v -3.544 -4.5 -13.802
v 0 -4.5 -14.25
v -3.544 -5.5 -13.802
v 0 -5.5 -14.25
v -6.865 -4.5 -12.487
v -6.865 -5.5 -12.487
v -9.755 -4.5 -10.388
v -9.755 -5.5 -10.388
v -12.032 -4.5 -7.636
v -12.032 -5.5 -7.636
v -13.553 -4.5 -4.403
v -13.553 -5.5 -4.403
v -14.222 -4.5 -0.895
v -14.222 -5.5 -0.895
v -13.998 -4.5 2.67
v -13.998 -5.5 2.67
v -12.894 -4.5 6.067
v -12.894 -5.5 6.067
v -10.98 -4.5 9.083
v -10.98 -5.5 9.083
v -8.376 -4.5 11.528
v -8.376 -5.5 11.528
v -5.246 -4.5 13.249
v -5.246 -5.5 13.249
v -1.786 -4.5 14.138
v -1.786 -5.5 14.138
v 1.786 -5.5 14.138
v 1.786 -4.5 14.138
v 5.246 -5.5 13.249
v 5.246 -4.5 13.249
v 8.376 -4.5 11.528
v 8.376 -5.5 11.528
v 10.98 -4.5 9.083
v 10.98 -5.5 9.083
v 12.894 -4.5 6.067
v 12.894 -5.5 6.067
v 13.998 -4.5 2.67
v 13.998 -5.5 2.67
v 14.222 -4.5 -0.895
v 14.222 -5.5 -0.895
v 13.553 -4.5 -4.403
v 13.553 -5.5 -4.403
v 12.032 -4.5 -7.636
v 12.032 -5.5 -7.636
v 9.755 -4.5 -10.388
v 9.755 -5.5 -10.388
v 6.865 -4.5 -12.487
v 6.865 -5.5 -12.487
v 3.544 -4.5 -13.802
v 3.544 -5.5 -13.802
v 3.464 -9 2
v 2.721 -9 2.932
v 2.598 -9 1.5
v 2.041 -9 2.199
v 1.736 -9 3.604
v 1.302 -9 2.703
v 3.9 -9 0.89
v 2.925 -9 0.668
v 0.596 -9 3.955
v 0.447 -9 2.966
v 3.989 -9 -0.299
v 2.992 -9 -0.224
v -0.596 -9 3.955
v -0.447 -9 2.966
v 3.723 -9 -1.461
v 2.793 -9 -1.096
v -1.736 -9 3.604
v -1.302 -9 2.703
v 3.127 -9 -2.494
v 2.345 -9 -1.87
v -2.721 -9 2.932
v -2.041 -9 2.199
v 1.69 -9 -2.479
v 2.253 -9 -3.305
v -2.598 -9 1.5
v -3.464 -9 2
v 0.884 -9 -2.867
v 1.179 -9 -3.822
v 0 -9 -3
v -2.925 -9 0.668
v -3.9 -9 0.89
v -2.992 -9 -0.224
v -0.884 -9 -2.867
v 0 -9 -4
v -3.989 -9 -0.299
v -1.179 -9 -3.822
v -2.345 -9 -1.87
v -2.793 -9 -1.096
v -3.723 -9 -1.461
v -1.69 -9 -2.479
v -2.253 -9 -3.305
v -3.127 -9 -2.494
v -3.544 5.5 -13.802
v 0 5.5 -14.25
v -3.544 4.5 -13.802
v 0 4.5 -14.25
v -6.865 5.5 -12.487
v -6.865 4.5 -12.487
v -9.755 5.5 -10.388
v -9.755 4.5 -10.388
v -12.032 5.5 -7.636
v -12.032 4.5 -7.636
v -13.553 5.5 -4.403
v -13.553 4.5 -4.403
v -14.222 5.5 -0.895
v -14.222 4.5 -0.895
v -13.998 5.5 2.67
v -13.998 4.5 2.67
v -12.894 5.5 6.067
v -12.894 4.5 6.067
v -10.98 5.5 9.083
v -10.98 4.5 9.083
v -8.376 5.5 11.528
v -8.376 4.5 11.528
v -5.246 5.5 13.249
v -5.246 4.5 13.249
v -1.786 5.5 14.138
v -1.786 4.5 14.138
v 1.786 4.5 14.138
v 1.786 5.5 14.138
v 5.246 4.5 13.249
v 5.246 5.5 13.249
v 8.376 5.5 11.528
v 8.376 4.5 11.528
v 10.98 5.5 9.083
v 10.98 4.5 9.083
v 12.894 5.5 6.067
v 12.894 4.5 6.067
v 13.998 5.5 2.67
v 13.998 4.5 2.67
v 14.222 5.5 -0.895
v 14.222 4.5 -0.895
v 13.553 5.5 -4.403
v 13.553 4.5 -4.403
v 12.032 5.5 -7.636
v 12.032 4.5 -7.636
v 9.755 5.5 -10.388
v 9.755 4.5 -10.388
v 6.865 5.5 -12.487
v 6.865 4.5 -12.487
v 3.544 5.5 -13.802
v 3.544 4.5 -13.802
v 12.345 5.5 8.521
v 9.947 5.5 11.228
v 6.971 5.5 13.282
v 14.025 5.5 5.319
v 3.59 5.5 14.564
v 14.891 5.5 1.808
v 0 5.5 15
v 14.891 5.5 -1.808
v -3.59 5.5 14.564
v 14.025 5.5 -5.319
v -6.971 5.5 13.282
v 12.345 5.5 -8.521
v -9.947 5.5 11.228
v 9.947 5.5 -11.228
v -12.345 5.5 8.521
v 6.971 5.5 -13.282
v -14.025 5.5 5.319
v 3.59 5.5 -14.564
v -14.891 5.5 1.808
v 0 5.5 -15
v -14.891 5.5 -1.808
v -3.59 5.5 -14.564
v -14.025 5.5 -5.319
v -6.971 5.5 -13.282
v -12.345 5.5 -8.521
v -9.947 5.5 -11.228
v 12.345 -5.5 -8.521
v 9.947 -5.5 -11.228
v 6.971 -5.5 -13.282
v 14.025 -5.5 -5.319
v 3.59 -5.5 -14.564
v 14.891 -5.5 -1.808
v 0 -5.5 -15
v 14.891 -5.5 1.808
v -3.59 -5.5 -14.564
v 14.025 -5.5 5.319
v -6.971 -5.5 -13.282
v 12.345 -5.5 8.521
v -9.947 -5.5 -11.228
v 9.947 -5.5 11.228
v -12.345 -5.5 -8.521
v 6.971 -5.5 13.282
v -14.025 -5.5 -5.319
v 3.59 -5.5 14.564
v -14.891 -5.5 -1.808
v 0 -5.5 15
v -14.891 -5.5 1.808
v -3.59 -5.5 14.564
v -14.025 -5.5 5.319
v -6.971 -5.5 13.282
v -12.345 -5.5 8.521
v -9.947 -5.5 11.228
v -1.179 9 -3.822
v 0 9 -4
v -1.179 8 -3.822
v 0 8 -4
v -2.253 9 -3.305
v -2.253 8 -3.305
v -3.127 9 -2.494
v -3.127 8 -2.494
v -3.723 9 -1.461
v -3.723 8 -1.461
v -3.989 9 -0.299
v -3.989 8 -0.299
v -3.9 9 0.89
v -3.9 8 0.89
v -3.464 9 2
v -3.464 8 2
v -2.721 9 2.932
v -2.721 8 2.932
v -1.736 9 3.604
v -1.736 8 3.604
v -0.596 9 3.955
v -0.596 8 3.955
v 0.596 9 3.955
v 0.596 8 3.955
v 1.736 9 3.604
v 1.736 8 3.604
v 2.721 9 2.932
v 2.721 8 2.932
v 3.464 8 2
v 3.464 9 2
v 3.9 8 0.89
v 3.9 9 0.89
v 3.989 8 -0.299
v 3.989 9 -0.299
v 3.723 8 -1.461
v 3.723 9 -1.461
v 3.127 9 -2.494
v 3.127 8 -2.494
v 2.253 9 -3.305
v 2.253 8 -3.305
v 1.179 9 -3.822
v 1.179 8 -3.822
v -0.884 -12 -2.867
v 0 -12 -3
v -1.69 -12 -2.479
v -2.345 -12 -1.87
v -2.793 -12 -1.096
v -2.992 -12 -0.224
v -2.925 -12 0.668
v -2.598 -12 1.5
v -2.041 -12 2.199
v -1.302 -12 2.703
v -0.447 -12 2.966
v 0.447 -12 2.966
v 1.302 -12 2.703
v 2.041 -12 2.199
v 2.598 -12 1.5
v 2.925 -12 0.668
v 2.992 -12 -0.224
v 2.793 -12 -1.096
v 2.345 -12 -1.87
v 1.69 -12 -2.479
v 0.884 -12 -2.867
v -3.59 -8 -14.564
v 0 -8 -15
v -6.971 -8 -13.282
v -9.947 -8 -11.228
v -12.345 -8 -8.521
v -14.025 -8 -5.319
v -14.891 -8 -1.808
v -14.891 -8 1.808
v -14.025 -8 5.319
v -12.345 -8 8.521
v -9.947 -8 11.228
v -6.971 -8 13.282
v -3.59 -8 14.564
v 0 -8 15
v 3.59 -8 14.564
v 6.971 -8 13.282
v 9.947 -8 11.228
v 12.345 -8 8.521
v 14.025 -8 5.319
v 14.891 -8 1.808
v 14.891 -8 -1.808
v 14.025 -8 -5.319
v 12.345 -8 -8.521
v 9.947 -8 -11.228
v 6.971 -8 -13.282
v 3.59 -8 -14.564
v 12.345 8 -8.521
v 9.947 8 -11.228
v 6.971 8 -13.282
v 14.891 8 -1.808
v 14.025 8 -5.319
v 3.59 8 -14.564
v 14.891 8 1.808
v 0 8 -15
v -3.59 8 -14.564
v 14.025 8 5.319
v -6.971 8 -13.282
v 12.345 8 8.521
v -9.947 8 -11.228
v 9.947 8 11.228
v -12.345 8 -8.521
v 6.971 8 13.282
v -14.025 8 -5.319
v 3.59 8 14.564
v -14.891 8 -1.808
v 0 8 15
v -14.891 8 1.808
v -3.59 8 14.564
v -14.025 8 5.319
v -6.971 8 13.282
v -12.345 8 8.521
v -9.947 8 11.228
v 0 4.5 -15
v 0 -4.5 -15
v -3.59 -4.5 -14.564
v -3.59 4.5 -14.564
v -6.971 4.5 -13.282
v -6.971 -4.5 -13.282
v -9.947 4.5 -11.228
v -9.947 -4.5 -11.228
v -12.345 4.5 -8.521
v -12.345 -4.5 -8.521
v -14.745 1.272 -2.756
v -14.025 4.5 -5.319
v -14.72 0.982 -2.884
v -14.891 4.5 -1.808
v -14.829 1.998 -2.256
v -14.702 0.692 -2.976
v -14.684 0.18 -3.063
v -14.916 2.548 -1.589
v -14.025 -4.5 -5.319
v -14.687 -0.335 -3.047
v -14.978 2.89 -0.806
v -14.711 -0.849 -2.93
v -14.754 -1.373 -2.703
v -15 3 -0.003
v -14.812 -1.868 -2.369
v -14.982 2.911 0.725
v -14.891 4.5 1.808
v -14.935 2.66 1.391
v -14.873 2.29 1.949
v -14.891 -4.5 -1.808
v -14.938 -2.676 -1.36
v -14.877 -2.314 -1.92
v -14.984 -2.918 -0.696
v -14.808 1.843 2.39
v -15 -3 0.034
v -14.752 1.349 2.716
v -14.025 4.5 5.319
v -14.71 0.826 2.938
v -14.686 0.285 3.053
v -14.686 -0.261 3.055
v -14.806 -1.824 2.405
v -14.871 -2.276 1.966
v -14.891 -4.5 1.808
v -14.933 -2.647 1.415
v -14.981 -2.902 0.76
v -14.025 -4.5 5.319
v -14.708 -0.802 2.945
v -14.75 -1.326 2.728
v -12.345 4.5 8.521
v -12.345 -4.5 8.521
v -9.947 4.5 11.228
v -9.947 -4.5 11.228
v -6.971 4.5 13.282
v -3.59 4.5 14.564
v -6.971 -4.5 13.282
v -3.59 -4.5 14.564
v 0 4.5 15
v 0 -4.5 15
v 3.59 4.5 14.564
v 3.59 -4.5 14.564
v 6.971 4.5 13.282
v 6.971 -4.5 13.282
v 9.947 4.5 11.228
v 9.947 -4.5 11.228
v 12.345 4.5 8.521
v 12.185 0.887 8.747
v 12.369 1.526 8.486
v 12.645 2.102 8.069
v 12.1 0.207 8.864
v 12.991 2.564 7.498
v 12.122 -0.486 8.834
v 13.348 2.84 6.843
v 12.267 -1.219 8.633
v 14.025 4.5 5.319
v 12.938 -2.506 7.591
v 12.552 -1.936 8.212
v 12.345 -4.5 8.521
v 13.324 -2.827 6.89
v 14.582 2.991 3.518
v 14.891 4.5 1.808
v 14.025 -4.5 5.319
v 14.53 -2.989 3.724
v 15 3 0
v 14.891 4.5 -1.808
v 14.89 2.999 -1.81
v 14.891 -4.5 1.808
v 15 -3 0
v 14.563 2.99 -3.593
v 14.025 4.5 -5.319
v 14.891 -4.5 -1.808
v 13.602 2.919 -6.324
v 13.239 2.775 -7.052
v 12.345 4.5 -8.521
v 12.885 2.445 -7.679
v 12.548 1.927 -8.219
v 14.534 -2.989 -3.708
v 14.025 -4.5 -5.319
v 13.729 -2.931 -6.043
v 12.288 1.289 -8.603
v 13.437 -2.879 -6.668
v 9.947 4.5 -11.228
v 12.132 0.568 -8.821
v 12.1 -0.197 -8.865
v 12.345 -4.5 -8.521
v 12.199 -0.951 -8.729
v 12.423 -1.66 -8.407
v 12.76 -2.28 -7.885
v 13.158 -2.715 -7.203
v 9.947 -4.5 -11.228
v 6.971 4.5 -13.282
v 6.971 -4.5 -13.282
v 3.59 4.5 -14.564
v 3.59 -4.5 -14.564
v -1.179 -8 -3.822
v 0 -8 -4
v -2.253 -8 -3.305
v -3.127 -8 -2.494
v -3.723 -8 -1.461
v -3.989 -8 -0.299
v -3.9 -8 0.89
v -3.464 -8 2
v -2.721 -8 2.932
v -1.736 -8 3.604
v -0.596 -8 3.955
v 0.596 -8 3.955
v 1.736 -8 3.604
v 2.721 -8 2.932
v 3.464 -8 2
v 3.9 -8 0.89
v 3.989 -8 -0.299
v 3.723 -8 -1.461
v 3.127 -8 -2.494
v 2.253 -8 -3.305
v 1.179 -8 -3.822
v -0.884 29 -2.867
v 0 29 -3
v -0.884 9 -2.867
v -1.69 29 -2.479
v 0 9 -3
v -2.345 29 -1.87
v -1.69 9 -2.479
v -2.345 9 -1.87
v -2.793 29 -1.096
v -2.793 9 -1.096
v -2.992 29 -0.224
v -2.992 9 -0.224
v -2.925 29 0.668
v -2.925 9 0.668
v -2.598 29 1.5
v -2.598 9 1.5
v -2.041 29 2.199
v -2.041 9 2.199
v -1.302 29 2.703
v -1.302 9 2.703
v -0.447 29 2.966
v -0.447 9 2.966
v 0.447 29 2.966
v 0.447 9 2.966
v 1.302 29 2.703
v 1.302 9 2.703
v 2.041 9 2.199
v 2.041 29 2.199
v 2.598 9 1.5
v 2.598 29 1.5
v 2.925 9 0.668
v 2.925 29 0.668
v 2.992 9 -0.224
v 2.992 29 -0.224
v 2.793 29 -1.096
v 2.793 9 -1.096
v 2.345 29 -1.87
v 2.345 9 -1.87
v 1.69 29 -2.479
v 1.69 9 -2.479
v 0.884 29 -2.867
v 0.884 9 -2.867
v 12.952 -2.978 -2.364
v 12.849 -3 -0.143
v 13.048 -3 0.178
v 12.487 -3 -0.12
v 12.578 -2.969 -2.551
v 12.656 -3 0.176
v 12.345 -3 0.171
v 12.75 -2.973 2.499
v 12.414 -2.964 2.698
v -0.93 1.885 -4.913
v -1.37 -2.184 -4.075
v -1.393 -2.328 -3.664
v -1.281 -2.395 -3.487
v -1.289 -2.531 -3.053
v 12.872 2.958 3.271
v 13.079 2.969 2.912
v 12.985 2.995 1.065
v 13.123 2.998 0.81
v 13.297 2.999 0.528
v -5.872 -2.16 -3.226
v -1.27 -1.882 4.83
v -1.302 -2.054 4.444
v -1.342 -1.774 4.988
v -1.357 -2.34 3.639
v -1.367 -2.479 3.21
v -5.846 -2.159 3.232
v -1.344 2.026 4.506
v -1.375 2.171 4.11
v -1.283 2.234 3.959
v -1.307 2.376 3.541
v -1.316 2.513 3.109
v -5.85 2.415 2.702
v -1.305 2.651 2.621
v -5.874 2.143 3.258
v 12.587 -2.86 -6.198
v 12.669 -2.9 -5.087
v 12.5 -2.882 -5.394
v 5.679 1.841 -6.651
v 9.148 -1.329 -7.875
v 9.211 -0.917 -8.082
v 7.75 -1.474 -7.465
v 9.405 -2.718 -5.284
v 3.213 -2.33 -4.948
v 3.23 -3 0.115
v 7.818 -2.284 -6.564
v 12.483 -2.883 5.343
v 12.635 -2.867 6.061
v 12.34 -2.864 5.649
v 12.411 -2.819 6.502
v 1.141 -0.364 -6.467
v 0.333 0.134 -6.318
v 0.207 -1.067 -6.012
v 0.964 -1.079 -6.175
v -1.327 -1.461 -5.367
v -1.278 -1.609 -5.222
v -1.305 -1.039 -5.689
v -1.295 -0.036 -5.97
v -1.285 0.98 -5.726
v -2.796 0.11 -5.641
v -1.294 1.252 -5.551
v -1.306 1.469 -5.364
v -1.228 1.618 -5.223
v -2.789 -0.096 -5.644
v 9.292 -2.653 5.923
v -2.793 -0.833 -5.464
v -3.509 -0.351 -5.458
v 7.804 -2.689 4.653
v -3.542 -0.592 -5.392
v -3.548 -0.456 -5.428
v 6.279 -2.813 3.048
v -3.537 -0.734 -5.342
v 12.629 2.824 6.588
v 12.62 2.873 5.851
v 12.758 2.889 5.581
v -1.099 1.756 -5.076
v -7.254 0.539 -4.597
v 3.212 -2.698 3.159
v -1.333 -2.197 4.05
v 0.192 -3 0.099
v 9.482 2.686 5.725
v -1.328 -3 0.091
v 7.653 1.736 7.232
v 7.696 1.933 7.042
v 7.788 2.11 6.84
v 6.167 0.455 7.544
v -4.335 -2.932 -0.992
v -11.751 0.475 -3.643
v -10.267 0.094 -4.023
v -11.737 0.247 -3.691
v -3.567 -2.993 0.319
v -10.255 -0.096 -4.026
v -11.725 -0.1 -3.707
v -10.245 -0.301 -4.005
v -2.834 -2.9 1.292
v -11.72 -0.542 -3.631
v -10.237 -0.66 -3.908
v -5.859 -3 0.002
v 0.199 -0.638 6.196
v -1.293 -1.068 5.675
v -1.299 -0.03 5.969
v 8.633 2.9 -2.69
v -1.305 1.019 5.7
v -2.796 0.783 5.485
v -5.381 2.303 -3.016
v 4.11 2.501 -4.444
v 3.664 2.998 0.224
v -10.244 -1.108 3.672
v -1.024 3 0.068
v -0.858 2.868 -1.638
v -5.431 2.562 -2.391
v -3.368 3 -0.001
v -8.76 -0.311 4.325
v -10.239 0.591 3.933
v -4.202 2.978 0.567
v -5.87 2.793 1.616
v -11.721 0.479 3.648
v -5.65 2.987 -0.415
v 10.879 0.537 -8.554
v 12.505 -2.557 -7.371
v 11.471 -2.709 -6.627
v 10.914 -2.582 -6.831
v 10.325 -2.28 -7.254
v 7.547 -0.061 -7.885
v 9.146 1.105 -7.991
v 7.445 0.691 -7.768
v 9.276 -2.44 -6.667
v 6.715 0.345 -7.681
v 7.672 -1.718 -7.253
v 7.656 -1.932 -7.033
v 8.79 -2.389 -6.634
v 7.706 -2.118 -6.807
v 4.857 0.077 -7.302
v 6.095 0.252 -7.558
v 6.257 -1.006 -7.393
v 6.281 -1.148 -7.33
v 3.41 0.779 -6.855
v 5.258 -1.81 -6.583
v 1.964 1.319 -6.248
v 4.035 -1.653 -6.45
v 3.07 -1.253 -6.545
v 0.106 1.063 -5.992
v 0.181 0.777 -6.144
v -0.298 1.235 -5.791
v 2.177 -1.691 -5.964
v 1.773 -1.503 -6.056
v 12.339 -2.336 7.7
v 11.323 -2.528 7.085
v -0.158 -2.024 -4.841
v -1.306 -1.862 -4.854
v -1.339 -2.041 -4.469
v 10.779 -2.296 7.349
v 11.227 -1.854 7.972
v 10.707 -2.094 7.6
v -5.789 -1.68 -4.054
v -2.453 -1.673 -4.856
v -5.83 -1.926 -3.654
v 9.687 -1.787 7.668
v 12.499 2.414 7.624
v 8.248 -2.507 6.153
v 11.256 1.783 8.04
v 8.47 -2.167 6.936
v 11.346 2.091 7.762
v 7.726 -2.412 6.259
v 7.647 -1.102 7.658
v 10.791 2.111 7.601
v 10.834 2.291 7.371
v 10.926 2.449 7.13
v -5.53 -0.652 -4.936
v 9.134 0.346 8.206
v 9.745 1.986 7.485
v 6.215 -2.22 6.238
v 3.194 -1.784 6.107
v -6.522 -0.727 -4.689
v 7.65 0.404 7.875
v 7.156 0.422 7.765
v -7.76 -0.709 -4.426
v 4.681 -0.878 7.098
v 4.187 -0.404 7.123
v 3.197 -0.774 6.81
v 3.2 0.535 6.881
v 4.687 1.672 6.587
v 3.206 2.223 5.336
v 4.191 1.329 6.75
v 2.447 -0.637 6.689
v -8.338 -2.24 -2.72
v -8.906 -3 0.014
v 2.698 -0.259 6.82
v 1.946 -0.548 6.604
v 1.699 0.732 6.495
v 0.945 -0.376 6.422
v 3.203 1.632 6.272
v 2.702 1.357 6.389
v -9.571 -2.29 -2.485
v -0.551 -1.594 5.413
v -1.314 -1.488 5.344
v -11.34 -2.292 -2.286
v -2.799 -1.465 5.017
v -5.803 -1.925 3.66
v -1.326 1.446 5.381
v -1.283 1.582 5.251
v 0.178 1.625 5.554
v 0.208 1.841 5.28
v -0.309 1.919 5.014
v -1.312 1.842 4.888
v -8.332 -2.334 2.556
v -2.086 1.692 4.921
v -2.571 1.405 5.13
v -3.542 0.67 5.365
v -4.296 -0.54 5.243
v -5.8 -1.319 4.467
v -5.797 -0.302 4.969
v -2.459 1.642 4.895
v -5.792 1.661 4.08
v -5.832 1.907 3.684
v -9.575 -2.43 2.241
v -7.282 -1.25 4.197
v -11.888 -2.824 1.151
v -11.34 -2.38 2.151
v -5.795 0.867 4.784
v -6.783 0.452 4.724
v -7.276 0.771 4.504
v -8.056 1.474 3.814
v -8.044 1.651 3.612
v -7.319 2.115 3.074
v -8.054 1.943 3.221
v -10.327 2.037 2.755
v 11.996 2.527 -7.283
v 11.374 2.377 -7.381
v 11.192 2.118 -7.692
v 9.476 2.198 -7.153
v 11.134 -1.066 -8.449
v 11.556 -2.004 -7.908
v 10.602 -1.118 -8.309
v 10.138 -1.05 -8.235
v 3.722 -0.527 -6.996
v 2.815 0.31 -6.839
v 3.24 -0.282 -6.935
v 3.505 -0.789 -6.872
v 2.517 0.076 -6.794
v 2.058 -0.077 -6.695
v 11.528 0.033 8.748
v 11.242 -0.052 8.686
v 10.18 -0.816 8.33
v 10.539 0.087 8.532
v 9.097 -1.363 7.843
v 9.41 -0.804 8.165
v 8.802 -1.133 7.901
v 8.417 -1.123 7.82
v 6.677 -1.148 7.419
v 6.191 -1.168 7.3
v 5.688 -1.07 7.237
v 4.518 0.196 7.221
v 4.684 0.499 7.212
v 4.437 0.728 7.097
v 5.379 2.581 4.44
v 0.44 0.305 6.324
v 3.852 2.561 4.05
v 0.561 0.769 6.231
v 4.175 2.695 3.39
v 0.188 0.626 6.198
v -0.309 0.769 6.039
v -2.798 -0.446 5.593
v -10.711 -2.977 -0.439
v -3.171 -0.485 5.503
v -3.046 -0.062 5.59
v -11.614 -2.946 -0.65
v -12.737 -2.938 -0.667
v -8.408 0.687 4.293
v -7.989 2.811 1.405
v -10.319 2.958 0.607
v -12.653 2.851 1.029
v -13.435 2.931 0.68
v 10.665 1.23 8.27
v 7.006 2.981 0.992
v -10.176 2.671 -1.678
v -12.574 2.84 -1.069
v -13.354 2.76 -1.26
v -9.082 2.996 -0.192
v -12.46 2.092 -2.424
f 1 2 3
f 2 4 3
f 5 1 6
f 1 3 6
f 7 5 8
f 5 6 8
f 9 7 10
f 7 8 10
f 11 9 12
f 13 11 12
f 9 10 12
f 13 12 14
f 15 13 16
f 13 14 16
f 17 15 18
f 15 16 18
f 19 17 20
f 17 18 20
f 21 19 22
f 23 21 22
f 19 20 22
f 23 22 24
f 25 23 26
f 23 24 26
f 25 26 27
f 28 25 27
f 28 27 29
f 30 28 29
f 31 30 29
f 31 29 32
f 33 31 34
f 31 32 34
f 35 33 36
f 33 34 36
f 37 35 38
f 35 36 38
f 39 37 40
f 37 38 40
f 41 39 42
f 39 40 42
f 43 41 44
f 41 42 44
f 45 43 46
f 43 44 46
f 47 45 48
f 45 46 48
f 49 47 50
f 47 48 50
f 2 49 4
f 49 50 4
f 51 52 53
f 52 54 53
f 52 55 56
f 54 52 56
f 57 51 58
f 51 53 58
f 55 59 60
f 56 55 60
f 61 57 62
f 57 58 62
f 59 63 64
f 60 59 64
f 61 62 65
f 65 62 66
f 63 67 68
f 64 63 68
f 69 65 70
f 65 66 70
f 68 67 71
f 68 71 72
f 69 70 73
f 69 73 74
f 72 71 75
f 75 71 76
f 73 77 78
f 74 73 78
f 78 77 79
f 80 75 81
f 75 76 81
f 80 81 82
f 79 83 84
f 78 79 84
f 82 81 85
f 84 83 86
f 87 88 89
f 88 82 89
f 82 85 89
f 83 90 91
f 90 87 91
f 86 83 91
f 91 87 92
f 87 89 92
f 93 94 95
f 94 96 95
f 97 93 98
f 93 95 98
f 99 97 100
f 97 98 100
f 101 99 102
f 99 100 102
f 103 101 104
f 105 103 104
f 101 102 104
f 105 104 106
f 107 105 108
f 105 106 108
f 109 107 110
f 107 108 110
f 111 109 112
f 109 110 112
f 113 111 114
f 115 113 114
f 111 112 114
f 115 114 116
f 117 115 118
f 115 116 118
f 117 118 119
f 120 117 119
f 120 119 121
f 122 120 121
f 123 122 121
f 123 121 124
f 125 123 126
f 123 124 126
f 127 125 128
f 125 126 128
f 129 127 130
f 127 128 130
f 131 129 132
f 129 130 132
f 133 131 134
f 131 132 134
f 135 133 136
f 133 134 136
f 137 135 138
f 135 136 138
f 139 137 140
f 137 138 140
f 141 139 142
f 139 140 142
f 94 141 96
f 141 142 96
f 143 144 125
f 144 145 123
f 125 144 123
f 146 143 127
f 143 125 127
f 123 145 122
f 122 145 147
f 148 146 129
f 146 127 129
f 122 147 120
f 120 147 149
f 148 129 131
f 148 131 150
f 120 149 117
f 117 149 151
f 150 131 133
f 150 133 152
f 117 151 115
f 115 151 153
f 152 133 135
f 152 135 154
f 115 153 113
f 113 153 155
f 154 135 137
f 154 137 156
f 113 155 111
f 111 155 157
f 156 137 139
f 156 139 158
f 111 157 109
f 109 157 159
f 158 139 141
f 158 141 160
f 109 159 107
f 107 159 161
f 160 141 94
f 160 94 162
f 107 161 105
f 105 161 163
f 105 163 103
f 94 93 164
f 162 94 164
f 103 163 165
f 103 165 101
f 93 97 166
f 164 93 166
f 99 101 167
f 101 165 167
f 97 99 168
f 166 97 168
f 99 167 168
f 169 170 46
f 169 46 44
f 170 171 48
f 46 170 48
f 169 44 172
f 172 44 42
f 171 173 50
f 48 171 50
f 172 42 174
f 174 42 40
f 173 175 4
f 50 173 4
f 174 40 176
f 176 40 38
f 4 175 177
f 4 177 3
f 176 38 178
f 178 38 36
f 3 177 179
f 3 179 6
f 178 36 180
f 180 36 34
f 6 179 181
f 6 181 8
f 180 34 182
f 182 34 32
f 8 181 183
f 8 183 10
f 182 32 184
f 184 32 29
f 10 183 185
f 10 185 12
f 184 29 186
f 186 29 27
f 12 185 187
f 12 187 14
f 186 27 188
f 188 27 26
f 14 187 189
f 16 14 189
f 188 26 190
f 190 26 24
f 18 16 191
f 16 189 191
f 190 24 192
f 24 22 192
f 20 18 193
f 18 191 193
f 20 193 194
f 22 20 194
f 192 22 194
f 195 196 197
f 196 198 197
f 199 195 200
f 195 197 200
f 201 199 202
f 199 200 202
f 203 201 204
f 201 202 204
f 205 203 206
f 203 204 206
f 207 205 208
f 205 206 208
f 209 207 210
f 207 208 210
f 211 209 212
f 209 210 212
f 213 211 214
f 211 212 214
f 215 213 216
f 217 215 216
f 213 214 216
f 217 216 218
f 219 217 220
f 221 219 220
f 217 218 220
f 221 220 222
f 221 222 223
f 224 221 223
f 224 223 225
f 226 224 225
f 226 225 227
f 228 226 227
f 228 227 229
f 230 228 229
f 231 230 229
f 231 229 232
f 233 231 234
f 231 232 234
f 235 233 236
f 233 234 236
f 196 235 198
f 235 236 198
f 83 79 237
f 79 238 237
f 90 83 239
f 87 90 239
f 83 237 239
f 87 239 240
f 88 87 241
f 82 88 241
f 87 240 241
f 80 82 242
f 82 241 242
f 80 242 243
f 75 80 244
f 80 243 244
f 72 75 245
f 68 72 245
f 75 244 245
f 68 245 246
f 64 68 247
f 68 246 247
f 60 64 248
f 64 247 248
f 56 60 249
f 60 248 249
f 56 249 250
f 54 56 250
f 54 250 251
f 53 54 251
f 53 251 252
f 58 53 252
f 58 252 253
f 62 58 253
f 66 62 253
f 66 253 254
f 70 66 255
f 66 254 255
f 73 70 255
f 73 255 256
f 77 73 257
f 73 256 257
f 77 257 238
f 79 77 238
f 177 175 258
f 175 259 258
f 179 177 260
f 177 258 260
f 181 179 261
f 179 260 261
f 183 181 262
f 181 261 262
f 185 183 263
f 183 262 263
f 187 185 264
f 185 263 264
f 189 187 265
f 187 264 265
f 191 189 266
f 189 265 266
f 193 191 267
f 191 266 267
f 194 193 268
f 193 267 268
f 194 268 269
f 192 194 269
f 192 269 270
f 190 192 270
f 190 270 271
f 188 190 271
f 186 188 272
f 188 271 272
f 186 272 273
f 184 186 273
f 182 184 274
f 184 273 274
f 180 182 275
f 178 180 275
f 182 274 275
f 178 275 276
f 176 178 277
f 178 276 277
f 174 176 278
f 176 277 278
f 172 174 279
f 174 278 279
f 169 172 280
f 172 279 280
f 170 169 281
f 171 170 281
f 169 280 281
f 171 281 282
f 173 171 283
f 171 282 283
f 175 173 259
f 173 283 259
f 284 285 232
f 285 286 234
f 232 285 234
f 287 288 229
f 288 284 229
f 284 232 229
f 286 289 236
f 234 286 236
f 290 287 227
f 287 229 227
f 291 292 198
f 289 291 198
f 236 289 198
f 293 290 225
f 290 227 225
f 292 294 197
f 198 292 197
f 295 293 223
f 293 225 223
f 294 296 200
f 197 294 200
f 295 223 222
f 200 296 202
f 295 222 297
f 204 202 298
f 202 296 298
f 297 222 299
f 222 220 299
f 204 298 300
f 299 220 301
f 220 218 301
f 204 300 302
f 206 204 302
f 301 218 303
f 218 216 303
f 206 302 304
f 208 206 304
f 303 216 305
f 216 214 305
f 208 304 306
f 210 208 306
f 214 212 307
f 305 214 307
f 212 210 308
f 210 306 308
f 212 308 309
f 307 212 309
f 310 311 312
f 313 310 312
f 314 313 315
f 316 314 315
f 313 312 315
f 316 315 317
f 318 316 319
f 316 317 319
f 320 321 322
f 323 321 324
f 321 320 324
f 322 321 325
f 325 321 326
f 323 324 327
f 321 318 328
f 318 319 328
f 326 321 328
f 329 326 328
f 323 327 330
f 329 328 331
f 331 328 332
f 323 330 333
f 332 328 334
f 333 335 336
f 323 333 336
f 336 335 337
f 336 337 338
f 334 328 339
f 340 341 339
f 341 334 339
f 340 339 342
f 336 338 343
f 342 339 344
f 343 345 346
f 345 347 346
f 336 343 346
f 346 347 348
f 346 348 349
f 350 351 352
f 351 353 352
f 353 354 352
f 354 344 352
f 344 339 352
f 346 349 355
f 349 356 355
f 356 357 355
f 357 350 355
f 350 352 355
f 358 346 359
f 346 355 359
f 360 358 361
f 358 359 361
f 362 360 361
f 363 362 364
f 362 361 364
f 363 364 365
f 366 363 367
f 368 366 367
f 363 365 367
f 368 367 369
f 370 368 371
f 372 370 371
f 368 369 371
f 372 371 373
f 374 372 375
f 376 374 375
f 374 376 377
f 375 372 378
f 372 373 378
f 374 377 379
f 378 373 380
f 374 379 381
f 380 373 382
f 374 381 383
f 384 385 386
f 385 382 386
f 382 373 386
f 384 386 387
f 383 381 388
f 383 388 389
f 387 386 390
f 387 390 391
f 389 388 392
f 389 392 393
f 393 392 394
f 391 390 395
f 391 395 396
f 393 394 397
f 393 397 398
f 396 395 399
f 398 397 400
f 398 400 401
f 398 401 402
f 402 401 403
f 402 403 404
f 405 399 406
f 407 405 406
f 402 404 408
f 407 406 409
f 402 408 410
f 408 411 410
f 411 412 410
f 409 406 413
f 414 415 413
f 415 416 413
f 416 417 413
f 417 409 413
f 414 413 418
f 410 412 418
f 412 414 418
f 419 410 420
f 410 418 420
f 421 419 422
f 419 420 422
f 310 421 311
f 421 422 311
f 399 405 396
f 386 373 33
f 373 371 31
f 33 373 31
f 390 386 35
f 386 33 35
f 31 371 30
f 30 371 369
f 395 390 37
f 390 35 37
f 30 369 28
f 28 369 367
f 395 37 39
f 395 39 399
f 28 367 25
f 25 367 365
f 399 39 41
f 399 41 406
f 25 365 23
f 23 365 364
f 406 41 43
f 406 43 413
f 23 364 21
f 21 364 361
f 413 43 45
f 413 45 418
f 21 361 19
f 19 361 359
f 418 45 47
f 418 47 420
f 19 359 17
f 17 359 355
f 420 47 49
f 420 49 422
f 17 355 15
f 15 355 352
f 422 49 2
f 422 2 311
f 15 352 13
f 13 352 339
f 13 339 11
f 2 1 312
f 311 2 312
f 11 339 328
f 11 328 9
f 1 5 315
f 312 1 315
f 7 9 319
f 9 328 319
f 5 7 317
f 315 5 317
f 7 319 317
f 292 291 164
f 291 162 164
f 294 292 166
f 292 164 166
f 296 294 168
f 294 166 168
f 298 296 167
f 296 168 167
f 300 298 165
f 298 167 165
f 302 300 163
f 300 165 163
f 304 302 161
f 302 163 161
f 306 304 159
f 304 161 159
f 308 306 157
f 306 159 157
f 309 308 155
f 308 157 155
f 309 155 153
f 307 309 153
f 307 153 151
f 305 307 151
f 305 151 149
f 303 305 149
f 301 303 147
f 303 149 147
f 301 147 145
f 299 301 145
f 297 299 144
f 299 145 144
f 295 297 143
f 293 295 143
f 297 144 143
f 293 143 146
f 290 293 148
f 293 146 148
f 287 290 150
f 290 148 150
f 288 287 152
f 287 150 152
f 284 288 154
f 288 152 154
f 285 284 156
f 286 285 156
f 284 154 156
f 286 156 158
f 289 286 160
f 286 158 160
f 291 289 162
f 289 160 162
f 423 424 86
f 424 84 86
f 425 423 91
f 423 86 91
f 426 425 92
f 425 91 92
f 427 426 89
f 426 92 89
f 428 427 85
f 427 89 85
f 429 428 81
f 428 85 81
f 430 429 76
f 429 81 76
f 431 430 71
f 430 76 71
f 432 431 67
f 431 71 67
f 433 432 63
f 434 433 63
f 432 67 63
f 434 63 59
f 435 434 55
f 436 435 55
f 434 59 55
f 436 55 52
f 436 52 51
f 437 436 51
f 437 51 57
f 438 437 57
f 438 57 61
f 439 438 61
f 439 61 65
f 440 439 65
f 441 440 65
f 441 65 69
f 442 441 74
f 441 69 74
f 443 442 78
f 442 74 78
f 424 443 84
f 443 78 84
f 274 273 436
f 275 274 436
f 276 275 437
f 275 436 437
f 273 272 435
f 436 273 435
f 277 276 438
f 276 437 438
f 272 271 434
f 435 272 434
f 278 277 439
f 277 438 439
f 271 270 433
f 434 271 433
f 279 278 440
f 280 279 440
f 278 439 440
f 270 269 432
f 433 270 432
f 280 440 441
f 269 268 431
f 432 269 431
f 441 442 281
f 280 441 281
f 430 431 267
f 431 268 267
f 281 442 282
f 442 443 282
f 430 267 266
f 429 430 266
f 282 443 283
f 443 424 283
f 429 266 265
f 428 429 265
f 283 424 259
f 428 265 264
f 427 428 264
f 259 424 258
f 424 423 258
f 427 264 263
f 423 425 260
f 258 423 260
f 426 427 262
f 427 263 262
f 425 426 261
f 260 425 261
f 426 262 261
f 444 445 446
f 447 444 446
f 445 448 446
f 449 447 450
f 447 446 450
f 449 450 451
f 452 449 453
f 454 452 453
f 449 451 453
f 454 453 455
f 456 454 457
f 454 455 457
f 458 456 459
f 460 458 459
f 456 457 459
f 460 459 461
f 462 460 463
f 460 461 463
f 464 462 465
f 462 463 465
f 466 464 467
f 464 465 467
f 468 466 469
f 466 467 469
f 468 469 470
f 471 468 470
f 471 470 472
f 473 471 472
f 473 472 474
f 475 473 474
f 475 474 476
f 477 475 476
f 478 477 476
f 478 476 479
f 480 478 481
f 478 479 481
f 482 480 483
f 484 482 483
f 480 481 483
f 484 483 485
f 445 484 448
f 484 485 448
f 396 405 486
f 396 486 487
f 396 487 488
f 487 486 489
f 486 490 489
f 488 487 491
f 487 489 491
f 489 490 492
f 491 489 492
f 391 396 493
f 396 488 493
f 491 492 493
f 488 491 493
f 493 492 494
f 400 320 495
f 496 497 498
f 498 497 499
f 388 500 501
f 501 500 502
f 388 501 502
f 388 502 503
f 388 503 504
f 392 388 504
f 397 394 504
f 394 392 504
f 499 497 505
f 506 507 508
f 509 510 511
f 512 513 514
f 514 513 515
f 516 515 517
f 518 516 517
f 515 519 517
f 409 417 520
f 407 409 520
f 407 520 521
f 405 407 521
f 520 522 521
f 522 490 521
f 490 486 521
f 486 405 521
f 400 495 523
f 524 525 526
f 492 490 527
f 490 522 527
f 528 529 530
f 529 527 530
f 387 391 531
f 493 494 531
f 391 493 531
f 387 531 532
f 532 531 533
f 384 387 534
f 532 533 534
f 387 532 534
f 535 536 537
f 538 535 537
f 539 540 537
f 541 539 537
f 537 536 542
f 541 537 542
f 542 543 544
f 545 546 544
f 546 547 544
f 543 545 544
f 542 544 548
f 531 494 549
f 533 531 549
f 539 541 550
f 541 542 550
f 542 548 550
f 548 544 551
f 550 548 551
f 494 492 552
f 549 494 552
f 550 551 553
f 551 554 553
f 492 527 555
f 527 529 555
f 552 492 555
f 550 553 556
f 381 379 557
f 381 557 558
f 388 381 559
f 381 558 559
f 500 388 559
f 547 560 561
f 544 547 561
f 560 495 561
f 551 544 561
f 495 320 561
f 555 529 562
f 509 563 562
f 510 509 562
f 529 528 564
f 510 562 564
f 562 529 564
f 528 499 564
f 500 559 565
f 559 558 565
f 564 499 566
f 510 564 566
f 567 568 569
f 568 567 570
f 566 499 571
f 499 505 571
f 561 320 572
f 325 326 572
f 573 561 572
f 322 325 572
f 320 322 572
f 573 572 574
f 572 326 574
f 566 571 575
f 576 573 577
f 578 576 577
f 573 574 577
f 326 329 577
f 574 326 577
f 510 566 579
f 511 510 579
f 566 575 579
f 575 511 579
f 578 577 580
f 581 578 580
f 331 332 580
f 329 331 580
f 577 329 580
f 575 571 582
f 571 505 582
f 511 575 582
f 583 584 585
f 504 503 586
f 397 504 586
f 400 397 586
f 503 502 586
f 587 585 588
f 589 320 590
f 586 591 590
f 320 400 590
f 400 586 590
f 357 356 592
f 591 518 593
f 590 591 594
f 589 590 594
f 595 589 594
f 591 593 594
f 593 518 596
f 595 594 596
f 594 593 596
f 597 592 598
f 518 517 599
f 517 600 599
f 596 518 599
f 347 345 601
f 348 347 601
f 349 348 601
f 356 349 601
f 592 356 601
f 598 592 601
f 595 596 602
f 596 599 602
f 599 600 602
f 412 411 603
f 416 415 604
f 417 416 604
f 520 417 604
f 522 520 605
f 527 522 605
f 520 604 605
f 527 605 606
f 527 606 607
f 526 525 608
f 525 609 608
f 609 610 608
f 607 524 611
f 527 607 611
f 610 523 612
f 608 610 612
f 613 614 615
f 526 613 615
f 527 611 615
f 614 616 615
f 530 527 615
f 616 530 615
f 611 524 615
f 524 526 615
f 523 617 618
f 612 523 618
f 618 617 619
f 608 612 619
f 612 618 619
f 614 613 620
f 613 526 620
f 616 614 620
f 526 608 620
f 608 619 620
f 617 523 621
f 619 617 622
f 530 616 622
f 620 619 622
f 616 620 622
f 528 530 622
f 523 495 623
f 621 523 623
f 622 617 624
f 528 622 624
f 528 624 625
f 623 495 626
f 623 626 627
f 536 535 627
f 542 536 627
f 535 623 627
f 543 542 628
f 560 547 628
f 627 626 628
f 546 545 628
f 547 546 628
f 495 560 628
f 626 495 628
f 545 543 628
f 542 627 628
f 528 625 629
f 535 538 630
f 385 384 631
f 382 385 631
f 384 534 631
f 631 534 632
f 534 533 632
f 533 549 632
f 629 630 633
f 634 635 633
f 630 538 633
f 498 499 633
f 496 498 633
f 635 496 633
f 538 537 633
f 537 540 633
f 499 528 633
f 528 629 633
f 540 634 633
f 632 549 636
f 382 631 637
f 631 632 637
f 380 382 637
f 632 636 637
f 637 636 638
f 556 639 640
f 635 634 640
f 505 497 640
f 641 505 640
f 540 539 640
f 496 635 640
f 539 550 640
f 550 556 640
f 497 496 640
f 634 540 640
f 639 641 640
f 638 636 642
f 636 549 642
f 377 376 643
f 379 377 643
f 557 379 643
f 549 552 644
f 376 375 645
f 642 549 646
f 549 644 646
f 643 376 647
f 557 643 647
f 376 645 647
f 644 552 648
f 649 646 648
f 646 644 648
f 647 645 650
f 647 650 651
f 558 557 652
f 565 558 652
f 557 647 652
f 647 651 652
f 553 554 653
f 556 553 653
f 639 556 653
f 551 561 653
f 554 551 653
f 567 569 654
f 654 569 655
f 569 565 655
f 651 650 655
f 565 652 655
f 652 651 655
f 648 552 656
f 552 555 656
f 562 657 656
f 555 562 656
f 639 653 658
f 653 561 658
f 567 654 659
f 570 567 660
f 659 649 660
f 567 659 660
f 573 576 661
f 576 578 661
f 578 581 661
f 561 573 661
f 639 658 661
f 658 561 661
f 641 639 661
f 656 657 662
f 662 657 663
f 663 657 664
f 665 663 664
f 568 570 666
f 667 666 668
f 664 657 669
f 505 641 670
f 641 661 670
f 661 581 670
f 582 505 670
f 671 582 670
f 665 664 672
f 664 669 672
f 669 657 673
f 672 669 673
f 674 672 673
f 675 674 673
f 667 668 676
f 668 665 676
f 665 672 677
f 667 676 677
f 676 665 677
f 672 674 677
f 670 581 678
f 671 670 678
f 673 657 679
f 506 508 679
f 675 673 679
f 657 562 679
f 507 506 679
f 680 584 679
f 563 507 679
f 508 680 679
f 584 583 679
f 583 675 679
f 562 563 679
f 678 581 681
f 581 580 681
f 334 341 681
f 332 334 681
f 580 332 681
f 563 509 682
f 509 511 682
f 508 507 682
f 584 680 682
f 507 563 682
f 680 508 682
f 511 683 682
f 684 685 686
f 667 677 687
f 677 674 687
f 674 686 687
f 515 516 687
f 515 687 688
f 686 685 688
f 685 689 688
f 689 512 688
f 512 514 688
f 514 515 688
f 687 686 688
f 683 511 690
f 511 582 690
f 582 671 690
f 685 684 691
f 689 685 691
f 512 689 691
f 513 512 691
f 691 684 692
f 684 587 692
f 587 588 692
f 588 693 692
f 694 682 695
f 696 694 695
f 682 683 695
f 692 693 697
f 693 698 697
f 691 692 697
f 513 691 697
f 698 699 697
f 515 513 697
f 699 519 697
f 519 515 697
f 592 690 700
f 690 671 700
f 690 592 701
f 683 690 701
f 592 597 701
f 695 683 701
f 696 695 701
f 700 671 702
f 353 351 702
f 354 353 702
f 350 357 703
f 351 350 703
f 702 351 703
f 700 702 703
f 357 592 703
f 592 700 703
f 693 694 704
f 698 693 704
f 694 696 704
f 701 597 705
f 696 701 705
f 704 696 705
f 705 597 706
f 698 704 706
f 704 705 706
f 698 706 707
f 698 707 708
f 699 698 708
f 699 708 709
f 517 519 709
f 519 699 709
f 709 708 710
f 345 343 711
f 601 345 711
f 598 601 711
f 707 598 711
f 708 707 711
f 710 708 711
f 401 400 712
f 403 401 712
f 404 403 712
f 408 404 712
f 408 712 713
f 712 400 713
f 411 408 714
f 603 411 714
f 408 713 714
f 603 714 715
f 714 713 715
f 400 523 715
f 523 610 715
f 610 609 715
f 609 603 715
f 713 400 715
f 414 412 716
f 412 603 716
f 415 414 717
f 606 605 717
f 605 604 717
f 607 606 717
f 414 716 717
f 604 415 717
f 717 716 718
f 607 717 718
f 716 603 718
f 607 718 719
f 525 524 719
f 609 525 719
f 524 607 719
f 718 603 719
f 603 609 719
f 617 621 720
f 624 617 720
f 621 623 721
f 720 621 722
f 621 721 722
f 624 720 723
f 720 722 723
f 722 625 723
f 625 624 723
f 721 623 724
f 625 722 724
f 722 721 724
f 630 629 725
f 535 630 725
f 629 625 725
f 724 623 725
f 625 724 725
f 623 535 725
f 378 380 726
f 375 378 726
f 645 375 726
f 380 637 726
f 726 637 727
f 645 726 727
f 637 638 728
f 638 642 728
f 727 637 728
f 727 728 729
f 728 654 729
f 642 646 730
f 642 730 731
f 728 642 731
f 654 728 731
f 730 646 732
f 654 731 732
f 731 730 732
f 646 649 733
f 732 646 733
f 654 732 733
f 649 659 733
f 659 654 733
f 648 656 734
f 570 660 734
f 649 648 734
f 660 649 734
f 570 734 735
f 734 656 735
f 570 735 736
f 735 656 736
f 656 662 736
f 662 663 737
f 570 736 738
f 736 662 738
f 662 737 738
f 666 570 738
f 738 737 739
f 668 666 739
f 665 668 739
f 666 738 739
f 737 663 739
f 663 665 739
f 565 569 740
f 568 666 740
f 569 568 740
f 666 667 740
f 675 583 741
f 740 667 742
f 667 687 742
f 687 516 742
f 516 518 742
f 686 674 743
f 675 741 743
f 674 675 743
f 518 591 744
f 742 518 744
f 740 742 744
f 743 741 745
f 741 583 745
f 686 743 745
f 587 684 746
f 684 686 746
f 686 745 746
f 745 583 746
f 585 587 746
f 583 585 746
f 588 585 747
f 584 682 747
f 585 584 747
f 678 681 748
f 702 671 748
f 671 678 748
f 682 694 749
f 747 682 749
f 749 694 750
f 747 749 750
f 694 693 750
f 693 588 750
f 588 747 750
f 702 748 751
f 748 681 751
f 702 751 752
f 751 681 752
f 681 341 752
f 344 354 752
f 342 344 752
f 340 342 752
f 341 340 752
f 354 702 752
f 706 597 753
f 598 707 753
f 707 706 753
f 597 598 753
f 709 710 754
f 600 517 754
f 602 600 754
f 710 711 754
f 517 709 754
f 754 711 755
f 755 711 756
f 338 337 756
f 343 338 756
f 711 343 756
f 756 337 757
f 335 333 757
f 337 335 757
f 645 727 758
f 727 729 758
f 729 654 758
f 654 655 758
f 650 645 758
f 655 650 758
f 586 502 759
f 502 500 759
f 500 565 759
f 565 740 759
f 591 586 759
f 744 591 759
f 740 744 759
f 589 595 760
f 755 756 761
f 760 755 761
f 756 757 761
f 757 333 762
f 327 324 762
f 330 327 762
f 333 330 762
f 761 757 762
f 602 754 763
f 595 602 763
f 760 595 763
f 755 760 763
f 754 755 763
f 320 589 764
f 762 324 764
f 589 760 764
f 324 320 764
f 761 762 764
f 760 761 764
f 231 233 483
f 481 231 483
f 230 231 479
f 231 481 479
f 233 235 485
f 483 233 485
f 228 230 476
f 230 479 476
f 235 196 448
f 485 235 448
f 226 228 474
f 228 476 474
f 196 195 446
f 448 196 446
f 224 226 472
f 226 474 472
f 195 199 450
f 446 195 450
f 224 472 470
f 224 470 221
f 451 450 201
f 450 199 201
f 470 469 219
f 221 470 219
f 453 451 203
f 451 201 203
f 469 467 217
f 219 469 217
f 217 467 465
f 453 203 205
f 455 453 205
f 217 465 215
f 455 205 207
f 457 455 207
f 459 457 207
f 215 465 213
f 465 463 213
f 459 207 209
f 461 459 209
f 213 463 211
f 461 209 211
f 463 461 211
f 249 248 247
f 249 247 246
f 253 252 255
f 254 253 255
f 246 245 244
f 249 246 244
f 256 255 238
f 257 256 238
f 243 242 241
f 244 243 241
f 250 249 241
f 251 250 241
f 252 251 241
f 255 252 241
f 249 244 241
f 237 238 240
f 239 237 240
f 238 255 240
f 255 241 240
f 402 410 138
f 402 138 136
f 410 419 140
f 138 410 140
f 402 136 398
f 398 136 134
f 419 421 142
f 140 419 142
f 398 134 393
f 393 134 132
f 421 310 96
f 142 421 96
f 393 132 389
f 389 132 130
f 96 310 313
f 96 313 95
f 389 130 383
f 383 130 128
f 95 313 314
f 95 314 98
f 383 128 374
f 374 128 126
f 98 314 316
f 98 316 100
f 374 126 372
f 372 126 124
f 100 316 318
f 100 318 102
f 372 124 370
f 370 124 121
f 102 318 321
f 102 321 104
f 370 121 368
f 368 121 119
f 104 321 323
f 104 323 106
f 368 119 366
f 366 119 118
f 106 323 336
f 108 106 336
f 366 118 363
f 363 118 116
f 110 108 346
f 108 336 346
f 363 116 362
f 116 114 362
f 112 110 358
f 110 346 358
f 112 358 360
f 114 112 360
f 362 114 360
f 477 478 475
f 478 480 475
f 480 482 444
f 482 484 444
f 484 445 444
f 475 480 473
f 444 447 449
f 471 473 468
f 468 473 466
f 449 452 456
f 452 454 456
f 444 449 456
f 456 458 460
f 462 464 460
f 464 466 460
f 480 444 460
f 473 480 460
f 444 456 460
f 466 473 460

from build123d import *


with BuildPart() as part:
    # Esboço1 → Revolução1 (revolve)
    with BuildSketch(Plane.XY, mode=Mode.PRIVATE) as revolu_o1_sk:
        Polygon((0, 29), (3, 29), (3, 9), (4, 9), (4, 8), (15, 8), (15, 5.5), (14.25, 5.5), (14.25, 4.5), (15, 4.5), (15, -4.5), (14.25, -4.5), (14.25, -5.5), (15, -5.5), (15, -8), (4, -8), (4, -9), (3, -9), (3, -12), (0, -12), (0, 0), align=None)
    revolve(revolu_o1_sk.sketch.rotate(Axis((0, 0, 0), (0, 1, 0)), 90), axis=Axis((0, 0, 0), (0, 1, 0)))

    # Loft de corte1: read off the stored shape, not the designer's step
    # Loft de corte1: loft between two sections, ruled curve by curve
    loft_de_corte1_from = [
        Edge.make_bspline([(15, 3, -6.499999998), (15, 3, -6.824955331), (15, 2.894080758, -7.511612667), (15, 2.323207443, -8.52324288), (15, 1.314094875, -9.301280201), (15, 0, -9.600009215), (15, -1.314094875, -9.301280201), (15, -2.323207443, -8.52324288), (15, -2.894080758, -7.511612667), (15, -3, -6.824955331), (15, -3, -5.890589586), (15, -3, -4.730897439), (15, -3, -3.107757012), (15, -3, -1.540026122), (15, -3, 0), (15, -3, 1.540026122), (15, -3, 3.107757012), (15, -3, 4.730897439), (15, -3, 5.890589586), (15, -3, 6.824955331), (15, -2.894080758, 7.511612667), (15, -2.323207443, 8.52324288), (15, -1.314094875, 9.301280201), (15, 0, 9.600009215), (15, 1.314094875, 9.301280201), (15, 2.323207443, 8.52324288), (15, 2.894080758, 7.511612667), (15, 3, 6.824955331), (15, 3, 5.890589586), (15, 3, 4.730897439), (15, 3, 3.107757012), (15, 3, 1.540026122), (15, 3, 0), (15, 3, -1.540026122), (15, 3, -3.107757012), (15, 3, -4.730897439), (15, 3, -5.890589586), (15, 3, -6.499999998)], [0, 0, 0, 0, 0.021736358, 0.043472716, 0.065209074, 0.086945432, 0.10868179, 0.130418148, 0.152154506, 0.173890864, 0.173890864, 0.214654506, 0.255418148, 0.29618179, 0.336945432, 0.377709074, 0.418472716, 0.459236358, 0.5, 0.5, 0.521736358, 0.543472716, 0.565209074, 0.586945432, 0.60868179, 0.630418148, 0.652154506, 0.673890864, 0.673890864, 0.714654506, 0.755418148, 0.79618179, 0.836945432, 0.877709074, 0.918472716, 0.959236358, 1, 1, 1, 1], 3),
    ]
    loft_de_corte1_to = [
        Edge.make_bspline([(-15, 1.257174528, -2.723878155), (-15, 1.133171283, -2.781110422), (-15, 0.904058011, -2.868761786), (-15, 0.593969465, -2.944793646), (-15, 0.29436397, -2.990374654), (-15, 0, -3.005552445), (-15, -0.29436397, -2.990374654), (-15, -0.593969465, -2.944793646), (-15, -0.904058011, -2.868761786), (-15, -1.133171283, -2.781110422), (-15, -1.489726085, -2.616546668), (-15, -1.943458979, -2.334486452), (-15, -2.518379121, -1.706139583), (-15, -2.907784722, -0.903903988), (-15, -3.046232987, 0), (-15, -2.907784722, 0.903903988), (-15, -2.518379121, 1.706139583), (-15, -1.943458979, 2.334486452), (-15, -1.489726085, 2.616546668), (-15, -1.133171283, 2.781110422), (-15, -0.904058011, 2.868761786), (-15, -0.593969465, 2.944793646), (-15, -0.29436397, 2.990374654), (-15, 0, 3.005552445), (-15, 0.29436397, 2.990374654), (-15, 0.593969465, 2.944793646), (-15, 0.904058011, 2.868761786), (-15, 1.133171283, 2.781110422), (-15, 1.489726085, 2.616546668), (-15, 1.943458979, 2.334486452), (-15, 2.518379121, 1.706139583), (-15, 2.907784722, 0.903903988), (-15, 3.046232987, 0), (-15, 2.907784722, -0.903903988), (-15, 2.518379121, -1.706139583), (-15, 1.943458979, -2.334486452), (-15, 1.489726085, -2.616546668), (-15, 1.257174528, -2.723878155)], [0, 0, 0, 0, 0.021736358, 0.043472716, 0.065209074, 0.086945432, 0.10868179, 0.130418148, 0.152154506, 0.173890864, 0.173890864, 0.214654506, 0.255418148, 0.29618179, 0.336945432, 0.377709074, 0.418472716, 0.459236358, 0.5, 0.5, 0.521736358, 0.543472716, 0.565209074, 0.586945432, 0.60868179, 0.630418148, 0.652154506, 0.673890864, 0.673890864, 0.714654506, 0.755418148, 0.79618179, 0.836945432, 0.877709074, 0.918472716, 0.959236358, 1, 1, 1, 1], 3),
    ]
    loft_de_corte1 = Solid(Shell([*[Face.make_surface_from_curves(loft_de_corte1_from[k], loft_de_corte1_to[k]) for k in range(1)], Face(Wire(loft_de_corte1_from)), Face(Wire(loft_de_corte1_to))]))
    add(loft_de_corte1, mode=Mode.SUBTRACT)


solid = part.part
